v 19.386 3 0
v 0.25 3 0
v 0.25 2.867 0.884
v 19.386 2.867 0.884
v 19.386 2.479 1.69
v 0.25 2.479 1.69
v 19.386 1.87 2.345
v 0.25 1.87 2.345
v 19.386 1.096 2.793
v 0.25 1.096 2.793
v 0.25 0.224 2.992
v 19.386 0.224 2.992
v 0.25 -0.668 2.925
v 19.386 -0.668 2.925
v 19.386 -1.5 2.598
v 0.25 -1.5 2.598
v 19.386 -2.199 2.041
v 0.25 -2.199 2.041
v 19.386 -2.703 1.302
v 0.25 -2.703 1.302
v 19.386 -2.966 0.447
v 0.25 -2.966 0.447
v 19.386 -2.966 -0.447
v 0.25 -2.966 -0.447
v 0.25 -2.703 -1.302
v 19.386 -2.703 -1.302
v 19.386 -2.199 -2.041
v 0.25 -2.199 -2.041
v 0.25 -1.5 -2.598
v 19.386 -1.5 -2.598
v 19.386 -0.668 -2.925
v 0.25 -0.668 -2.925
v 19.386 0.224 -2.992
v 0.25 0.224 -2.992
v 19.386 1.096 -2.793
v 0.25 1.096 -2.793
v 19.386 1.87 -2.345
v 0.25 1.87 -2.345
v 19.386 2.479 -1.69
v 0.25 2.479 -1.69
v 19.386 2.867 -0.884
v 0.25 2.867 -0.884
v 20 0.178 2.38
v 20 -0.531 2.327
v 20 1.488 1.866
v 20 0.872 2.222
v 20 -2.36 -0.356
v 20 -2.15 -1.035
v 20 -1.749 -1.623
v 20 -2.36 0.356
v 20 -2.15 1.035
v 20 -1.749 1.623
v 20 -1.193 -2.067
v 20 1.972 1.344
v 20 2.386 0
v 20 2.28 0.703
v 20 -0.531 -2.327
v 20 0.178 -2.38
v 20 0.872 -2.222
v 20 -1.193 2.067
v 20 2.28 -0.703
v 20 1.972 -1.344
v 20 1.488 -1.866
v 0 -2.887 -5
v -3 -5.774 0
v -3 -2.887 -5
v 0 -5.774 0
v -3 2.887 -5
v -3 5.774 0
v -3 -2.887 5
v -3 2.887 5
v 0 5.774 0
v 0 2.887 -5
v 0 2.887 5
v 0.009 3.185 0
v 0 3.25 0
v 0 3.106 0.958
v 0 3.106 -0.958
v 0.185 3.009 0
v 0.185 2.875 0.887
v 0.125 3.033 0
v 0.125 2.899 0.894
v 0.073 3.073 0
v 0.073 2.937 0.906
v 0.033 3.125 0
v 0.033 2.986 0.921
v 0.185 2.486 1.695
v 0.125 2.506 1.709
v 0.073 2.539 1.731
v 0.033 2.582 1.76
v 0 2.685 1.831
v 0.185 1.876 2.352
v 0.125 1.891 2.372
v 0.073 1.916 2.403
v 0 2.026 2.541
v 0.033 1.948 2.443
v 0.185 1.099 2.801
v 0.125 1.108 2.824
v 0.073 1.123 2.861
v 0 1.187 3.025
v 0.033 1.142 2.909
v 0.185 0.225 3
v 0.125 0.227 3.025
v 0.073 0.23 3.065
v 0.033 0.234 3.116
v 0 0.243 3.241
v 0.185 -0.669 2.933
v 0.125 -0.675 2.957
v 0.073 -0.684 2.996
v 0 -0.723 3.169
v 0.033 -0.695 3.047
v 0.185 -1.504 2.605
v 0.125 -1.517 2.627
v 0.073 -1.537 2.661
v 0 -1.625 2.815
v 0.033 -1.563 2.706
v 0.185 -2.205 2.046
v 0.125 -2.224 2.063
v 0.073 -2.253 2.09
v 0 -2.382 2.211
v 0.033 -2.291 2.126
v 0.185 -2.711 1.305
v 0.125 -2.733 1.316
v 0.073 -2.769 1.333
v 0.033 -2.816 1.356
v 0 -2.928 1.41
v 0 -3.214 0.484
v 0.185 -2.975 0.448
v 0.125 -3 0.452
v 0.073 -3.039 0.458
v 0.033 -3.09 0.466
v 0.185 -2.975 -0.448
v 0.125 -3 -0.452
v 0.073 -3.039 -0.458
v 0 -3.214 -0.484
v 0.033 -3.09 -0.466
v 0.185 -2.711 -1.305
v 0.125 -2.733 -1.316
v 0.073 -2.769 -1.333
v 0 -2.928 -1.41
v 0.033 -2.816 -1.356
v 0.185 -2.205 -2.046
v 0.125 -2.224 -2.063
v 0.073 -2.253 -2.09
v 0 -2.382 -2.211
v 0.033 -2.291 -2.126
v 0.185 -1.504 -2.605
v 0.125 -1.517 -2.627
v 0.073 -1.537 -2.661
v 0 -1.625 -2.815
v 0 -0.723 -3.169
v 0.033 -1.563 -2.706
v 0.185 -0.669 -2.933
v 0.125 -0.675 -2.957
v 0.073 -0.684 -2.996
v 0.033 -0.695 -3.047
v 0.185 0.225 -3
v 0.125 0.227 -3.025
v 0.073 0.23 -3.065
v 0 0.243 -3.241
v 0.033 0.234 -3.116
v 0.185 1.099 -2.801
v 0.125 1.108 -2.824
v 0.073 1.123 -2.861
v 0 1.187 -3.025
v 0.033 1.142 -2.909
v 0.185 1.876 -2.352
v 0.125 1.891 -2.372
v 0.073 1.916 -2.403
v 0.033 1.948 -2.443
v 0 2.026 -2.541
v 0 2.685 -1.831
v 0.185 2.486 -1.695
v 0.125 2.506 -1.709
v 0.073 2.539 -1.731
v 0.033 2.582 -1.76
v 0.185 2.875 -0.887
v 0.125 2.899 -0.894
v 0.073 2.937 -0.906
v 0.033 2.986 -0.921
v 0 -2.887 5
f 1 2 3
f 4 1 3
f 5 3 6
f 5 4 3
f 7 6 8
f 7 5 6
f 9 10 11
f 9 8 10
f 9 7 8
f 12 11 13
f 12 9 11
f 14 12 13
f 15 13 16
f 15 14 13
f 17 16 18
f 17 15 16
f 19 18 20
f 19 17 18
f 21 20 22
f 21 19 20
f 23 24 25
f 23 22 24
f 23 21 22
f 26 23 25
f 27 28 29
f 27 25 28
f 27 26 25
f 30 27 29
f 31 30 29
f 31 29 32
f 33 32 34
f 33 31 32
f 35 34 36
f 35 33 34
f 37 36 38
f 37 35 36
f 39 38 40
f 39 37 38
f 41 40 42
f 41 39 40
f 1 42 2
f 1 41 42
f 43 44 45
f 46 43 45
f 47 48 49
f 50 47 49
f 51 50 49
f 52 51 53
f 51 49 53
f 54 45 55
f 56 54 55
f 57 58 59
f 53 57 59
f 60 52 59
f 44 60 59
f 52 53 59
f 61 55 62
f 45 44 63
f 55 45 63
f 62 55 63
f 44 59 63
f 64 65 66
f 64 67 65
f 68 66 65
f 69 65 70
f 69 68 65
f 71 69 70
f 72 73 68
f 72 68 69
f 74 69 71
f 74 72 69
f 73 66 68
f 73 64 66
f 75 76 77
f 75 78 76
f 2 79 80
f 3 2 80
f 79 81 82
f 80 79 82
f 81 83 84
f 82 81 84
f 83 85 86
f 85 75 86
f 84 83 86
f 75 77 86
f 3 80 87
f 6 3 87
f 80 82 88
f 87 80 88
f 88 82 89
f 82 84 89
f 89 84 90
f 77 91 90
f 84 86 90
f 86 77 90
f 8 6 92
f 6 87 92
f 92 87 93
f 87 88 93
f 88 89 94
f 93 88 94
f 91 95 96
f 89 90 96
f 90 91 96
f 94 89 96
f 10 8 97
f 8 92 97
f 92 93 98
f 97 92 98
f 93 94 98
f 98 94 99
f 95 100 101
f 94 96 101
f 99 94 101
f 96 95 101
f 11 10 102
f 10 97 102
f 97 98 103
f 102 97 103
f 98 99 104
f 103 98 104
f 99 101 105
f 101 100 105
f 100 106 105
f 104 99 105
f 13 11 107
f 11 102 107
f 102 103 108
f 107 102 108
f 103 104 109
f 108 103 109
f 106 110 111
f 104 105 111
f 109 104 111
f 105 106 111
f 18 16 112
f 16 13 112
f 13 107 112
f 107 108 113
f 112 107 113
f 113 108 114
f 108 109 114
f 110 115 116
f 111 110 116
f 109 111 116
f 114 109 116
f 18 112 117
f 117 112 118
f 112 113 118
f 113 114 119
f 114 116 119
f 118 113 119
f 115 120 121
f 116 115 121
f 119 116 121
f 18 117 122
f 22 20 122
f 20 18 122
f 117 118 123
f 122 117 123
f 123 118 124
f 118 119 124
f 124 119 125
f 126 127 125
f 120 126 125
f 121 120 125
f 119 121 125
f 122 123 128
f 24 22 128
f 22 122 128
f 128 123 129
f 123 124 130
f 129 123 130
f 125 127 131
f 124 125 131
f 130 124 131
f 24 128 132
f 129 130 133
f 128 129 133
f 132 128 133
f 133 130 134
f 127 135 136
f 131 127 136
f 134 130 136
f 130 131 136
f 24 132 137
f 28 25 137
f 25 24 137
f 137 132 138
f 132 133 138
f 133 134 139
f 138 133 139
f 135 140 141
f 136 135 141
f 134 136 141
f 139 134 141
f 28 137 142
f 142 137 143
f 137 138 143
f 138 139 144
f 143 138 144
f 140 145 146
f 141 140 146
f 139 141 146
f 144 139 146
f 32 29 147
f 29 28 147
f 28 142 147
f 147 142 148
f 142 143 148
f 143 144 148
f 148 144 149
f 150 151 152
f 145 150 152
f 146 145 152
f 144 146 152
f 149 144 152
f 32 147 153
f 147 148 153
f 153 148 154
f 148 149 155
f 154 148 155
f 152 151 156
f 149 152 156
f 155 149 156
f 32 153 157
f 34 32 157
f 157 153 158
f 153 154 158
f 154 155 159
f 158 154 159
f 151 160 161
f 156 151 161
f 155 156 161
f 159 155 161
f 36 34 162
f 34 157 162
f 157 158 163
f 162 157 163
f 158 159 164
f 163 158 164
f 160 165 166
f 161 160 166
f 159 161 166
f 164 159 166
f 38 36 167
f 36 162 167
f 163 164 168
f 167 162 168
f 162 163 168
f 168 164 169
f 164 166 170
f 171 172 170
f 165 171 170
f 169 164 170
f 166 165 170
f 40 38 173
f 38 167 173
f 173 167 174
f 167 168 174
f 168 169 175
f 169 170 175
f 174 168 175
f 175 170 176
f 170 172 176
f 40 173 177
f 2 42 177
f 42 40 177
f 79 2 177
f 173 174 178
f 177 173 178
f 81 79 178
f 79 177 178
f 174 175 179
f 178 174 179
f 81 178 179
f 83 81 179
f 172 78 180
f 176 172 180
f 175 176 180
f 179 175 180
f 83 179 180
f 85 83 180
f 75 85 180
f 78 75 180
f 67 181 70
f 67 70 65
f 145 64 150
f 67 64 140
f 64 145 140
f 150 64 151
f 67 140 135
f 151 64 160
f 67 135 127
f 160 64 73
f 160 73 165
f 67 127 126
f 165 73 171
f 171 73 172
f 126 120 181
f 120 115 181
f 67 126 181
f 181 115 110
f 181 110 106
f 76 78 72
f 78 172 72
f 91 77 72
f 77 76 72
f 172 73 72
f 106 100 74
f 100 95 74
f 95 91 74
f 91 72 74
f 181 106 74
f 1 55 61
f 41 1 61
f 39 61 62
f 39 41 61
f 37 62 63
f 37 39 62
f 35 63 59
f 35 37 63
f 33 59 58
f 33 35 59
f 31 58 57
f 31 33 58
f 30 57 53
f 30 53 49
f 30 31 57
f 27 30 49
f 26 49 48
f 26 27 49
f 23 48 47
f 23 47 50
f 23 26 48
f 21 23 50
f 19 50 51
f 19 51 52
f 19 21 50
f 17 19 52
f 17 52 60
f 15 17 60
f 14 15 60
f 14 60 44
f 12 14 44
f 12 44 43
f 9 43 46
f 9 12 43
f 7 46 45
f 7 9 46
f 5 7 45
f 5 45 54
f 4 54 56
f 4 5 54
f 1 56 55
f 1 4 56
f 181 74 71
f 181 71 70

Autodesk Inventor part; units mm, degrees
ref_plane "YZ Plane" through (0, 0, 0) normal (1, 0, 0) x (0, 1, 0)
ref_plane "XZ Plane" through (0, 0, 0) normal (0, 1, 0) x (-1, 0, 0)
sketch "Sketch1" plane through (0, 0, 0) normal (0, 0, 1) x (1, 0, 0)
  line L0 (0, 3) -> (20, 3)
  line L1 (20, 3) -> (20, 0)
  line L2 (20, 0) -> (0, 0)
  line L3 (-4, 0) -> (24, 0) projected
  line L4 (0, -0.6) -> (0, 3.6) projected
  line L5 (0, 3) -> (0, 0)
  dimension "d2" = 6
  dimension "d59" = 20
revolve "Body" add sketch "Sketch1" angle 360 about axis through (20, 0, 0) along (-1, 0, 0)
sketch "Sketch2" plane through (0, 0, 0) normal (-1, 0, 0) x (0, 0, 1)
  line L0 (0, 5.7735) -> (5, 2.8868)
  line L1 (5, 2.8868) -> (5, -2.8868)
  line L2 (5, -2.8868) -> (0, -5.7735)
  line L3 (0, -5.7735) -> (-5, -2.8868)
  line L4 (-5, -2.8868) -> (-5, 2.8868)
  line L5 (-5, 2.8868) -> (0, 5.7735)
  line L6 (-7, 0) -> (7, 0) projected
  line L7 (0, 8.0829) -> (0, -8.0829) projected
  point P0 (0, 0)
  point P1 (0, 0)
  dimension "d11" = 10
extrude "Head" add sketch "Sketch2" along normal blind 4
sketch "Sketch4" plane through (0, 0, 0) normal (0, 0, 1) x (1, 0, 0)
  line L0 (-3.4226, 6) -> (-4, 5)
  line L1 (-1.1, 0) -> (-0.234, 0)
  line L2 (-4.7532, 0) -> (0.5192, 0) projected
  line L3 (-4, 6) -> (-3.4226, 6)
  line L4 (-4, 5) -> (-4, 6)
  line L5 (0, 7.2) -> (0, -1.2) projected
  dimension "d65" = 10
  dimension "d67" = 30
  dimension "d68" = 12
  dimension "d69" = 4
revolve "Chamfer1" cut sketch "Sketch4" angle 360 about axis through (-1.1, 0, 0) along (1, 0, 0)
thread "Thread" size "M6x1" designation "M6" class "6g" standard "GB Metric profile" length 19
chamfer "Chamfer2" distance 0.6135 distance2 0.6136 1 edges at (20, -3, 0) measured on face at (20, -0.301, 1.1526)
fillet "Fillet2" radius 0.25 1 edges at (0, -3, 0)
ref_plane "Work Plane1" through (1.525, 0, 0) normal (0, 0, 1) x (1, 0, 0)
sketch "Sketch7" plane through (-4, 0, 0) normal (-1, 0, 0) x (0, 0, 1)
  arc A0 (2.5, 4.3301) -> (-2.5, 4.3301) centre (0, 0) ccw projected
  circle A1 centre (0, 0) radius 6.6144
extrude "Extrusion5" cut sketch "Sketch7" against normal blind 1
equation "\"d2\" = GD"
equation "\"d59\" = NLG"
equation "\"d11\" = SW"
equation "\"d3\" = KOH"
equation "\"d71\" = RR"
equation "\"d15\" = GEL"
equation "\"d6\" = -0.5 * SPD + 0.5 * GD"
equation "\"d65\" = SW"
equation "\"d67\" = ANG1"
equation "\"d68\" = 1.2 * SW"
equation "\"d69\" = KOH"
equation "\"NLG\" = 20"
equation "\"GD\" = NND"
equation "\"BDM\" = NND"
equation "\"KOH\" = 4"
equation "\"GEL\" = 19"
equation "\"SW\" = 10"
equation "\"SPD\" = NND - 1.2269 * PTC"
equation "\"SD2\" = NND"
equation "\"SD\" = 0"
equation "\"ANG1\" = 30deg"
equation "\"GAL\" = 0.61345 * PTC"
equation "\"GUL\" = 0.61345 * PTC"
equation "\"RR\" = 0.25"
equation "\"RR1\" = 0.1"
equation "\"WFT\" = 0"
equation "\"GD1\" = THREADDIA - 1.2269 * PTC"
equation "\"THREADDIA\" = 6"
equation "\"TOA\" = 30deg"
equation "\"FAWI\" = 90deg"
equation "\"PTC\" = 1"
equation "\"NND\" = 6"
equation "\"E0\" = 1.155 * SW"
properties part number "Hexagon bolt GB/T 5781 M6 x 20" material "Steel, Mild"
